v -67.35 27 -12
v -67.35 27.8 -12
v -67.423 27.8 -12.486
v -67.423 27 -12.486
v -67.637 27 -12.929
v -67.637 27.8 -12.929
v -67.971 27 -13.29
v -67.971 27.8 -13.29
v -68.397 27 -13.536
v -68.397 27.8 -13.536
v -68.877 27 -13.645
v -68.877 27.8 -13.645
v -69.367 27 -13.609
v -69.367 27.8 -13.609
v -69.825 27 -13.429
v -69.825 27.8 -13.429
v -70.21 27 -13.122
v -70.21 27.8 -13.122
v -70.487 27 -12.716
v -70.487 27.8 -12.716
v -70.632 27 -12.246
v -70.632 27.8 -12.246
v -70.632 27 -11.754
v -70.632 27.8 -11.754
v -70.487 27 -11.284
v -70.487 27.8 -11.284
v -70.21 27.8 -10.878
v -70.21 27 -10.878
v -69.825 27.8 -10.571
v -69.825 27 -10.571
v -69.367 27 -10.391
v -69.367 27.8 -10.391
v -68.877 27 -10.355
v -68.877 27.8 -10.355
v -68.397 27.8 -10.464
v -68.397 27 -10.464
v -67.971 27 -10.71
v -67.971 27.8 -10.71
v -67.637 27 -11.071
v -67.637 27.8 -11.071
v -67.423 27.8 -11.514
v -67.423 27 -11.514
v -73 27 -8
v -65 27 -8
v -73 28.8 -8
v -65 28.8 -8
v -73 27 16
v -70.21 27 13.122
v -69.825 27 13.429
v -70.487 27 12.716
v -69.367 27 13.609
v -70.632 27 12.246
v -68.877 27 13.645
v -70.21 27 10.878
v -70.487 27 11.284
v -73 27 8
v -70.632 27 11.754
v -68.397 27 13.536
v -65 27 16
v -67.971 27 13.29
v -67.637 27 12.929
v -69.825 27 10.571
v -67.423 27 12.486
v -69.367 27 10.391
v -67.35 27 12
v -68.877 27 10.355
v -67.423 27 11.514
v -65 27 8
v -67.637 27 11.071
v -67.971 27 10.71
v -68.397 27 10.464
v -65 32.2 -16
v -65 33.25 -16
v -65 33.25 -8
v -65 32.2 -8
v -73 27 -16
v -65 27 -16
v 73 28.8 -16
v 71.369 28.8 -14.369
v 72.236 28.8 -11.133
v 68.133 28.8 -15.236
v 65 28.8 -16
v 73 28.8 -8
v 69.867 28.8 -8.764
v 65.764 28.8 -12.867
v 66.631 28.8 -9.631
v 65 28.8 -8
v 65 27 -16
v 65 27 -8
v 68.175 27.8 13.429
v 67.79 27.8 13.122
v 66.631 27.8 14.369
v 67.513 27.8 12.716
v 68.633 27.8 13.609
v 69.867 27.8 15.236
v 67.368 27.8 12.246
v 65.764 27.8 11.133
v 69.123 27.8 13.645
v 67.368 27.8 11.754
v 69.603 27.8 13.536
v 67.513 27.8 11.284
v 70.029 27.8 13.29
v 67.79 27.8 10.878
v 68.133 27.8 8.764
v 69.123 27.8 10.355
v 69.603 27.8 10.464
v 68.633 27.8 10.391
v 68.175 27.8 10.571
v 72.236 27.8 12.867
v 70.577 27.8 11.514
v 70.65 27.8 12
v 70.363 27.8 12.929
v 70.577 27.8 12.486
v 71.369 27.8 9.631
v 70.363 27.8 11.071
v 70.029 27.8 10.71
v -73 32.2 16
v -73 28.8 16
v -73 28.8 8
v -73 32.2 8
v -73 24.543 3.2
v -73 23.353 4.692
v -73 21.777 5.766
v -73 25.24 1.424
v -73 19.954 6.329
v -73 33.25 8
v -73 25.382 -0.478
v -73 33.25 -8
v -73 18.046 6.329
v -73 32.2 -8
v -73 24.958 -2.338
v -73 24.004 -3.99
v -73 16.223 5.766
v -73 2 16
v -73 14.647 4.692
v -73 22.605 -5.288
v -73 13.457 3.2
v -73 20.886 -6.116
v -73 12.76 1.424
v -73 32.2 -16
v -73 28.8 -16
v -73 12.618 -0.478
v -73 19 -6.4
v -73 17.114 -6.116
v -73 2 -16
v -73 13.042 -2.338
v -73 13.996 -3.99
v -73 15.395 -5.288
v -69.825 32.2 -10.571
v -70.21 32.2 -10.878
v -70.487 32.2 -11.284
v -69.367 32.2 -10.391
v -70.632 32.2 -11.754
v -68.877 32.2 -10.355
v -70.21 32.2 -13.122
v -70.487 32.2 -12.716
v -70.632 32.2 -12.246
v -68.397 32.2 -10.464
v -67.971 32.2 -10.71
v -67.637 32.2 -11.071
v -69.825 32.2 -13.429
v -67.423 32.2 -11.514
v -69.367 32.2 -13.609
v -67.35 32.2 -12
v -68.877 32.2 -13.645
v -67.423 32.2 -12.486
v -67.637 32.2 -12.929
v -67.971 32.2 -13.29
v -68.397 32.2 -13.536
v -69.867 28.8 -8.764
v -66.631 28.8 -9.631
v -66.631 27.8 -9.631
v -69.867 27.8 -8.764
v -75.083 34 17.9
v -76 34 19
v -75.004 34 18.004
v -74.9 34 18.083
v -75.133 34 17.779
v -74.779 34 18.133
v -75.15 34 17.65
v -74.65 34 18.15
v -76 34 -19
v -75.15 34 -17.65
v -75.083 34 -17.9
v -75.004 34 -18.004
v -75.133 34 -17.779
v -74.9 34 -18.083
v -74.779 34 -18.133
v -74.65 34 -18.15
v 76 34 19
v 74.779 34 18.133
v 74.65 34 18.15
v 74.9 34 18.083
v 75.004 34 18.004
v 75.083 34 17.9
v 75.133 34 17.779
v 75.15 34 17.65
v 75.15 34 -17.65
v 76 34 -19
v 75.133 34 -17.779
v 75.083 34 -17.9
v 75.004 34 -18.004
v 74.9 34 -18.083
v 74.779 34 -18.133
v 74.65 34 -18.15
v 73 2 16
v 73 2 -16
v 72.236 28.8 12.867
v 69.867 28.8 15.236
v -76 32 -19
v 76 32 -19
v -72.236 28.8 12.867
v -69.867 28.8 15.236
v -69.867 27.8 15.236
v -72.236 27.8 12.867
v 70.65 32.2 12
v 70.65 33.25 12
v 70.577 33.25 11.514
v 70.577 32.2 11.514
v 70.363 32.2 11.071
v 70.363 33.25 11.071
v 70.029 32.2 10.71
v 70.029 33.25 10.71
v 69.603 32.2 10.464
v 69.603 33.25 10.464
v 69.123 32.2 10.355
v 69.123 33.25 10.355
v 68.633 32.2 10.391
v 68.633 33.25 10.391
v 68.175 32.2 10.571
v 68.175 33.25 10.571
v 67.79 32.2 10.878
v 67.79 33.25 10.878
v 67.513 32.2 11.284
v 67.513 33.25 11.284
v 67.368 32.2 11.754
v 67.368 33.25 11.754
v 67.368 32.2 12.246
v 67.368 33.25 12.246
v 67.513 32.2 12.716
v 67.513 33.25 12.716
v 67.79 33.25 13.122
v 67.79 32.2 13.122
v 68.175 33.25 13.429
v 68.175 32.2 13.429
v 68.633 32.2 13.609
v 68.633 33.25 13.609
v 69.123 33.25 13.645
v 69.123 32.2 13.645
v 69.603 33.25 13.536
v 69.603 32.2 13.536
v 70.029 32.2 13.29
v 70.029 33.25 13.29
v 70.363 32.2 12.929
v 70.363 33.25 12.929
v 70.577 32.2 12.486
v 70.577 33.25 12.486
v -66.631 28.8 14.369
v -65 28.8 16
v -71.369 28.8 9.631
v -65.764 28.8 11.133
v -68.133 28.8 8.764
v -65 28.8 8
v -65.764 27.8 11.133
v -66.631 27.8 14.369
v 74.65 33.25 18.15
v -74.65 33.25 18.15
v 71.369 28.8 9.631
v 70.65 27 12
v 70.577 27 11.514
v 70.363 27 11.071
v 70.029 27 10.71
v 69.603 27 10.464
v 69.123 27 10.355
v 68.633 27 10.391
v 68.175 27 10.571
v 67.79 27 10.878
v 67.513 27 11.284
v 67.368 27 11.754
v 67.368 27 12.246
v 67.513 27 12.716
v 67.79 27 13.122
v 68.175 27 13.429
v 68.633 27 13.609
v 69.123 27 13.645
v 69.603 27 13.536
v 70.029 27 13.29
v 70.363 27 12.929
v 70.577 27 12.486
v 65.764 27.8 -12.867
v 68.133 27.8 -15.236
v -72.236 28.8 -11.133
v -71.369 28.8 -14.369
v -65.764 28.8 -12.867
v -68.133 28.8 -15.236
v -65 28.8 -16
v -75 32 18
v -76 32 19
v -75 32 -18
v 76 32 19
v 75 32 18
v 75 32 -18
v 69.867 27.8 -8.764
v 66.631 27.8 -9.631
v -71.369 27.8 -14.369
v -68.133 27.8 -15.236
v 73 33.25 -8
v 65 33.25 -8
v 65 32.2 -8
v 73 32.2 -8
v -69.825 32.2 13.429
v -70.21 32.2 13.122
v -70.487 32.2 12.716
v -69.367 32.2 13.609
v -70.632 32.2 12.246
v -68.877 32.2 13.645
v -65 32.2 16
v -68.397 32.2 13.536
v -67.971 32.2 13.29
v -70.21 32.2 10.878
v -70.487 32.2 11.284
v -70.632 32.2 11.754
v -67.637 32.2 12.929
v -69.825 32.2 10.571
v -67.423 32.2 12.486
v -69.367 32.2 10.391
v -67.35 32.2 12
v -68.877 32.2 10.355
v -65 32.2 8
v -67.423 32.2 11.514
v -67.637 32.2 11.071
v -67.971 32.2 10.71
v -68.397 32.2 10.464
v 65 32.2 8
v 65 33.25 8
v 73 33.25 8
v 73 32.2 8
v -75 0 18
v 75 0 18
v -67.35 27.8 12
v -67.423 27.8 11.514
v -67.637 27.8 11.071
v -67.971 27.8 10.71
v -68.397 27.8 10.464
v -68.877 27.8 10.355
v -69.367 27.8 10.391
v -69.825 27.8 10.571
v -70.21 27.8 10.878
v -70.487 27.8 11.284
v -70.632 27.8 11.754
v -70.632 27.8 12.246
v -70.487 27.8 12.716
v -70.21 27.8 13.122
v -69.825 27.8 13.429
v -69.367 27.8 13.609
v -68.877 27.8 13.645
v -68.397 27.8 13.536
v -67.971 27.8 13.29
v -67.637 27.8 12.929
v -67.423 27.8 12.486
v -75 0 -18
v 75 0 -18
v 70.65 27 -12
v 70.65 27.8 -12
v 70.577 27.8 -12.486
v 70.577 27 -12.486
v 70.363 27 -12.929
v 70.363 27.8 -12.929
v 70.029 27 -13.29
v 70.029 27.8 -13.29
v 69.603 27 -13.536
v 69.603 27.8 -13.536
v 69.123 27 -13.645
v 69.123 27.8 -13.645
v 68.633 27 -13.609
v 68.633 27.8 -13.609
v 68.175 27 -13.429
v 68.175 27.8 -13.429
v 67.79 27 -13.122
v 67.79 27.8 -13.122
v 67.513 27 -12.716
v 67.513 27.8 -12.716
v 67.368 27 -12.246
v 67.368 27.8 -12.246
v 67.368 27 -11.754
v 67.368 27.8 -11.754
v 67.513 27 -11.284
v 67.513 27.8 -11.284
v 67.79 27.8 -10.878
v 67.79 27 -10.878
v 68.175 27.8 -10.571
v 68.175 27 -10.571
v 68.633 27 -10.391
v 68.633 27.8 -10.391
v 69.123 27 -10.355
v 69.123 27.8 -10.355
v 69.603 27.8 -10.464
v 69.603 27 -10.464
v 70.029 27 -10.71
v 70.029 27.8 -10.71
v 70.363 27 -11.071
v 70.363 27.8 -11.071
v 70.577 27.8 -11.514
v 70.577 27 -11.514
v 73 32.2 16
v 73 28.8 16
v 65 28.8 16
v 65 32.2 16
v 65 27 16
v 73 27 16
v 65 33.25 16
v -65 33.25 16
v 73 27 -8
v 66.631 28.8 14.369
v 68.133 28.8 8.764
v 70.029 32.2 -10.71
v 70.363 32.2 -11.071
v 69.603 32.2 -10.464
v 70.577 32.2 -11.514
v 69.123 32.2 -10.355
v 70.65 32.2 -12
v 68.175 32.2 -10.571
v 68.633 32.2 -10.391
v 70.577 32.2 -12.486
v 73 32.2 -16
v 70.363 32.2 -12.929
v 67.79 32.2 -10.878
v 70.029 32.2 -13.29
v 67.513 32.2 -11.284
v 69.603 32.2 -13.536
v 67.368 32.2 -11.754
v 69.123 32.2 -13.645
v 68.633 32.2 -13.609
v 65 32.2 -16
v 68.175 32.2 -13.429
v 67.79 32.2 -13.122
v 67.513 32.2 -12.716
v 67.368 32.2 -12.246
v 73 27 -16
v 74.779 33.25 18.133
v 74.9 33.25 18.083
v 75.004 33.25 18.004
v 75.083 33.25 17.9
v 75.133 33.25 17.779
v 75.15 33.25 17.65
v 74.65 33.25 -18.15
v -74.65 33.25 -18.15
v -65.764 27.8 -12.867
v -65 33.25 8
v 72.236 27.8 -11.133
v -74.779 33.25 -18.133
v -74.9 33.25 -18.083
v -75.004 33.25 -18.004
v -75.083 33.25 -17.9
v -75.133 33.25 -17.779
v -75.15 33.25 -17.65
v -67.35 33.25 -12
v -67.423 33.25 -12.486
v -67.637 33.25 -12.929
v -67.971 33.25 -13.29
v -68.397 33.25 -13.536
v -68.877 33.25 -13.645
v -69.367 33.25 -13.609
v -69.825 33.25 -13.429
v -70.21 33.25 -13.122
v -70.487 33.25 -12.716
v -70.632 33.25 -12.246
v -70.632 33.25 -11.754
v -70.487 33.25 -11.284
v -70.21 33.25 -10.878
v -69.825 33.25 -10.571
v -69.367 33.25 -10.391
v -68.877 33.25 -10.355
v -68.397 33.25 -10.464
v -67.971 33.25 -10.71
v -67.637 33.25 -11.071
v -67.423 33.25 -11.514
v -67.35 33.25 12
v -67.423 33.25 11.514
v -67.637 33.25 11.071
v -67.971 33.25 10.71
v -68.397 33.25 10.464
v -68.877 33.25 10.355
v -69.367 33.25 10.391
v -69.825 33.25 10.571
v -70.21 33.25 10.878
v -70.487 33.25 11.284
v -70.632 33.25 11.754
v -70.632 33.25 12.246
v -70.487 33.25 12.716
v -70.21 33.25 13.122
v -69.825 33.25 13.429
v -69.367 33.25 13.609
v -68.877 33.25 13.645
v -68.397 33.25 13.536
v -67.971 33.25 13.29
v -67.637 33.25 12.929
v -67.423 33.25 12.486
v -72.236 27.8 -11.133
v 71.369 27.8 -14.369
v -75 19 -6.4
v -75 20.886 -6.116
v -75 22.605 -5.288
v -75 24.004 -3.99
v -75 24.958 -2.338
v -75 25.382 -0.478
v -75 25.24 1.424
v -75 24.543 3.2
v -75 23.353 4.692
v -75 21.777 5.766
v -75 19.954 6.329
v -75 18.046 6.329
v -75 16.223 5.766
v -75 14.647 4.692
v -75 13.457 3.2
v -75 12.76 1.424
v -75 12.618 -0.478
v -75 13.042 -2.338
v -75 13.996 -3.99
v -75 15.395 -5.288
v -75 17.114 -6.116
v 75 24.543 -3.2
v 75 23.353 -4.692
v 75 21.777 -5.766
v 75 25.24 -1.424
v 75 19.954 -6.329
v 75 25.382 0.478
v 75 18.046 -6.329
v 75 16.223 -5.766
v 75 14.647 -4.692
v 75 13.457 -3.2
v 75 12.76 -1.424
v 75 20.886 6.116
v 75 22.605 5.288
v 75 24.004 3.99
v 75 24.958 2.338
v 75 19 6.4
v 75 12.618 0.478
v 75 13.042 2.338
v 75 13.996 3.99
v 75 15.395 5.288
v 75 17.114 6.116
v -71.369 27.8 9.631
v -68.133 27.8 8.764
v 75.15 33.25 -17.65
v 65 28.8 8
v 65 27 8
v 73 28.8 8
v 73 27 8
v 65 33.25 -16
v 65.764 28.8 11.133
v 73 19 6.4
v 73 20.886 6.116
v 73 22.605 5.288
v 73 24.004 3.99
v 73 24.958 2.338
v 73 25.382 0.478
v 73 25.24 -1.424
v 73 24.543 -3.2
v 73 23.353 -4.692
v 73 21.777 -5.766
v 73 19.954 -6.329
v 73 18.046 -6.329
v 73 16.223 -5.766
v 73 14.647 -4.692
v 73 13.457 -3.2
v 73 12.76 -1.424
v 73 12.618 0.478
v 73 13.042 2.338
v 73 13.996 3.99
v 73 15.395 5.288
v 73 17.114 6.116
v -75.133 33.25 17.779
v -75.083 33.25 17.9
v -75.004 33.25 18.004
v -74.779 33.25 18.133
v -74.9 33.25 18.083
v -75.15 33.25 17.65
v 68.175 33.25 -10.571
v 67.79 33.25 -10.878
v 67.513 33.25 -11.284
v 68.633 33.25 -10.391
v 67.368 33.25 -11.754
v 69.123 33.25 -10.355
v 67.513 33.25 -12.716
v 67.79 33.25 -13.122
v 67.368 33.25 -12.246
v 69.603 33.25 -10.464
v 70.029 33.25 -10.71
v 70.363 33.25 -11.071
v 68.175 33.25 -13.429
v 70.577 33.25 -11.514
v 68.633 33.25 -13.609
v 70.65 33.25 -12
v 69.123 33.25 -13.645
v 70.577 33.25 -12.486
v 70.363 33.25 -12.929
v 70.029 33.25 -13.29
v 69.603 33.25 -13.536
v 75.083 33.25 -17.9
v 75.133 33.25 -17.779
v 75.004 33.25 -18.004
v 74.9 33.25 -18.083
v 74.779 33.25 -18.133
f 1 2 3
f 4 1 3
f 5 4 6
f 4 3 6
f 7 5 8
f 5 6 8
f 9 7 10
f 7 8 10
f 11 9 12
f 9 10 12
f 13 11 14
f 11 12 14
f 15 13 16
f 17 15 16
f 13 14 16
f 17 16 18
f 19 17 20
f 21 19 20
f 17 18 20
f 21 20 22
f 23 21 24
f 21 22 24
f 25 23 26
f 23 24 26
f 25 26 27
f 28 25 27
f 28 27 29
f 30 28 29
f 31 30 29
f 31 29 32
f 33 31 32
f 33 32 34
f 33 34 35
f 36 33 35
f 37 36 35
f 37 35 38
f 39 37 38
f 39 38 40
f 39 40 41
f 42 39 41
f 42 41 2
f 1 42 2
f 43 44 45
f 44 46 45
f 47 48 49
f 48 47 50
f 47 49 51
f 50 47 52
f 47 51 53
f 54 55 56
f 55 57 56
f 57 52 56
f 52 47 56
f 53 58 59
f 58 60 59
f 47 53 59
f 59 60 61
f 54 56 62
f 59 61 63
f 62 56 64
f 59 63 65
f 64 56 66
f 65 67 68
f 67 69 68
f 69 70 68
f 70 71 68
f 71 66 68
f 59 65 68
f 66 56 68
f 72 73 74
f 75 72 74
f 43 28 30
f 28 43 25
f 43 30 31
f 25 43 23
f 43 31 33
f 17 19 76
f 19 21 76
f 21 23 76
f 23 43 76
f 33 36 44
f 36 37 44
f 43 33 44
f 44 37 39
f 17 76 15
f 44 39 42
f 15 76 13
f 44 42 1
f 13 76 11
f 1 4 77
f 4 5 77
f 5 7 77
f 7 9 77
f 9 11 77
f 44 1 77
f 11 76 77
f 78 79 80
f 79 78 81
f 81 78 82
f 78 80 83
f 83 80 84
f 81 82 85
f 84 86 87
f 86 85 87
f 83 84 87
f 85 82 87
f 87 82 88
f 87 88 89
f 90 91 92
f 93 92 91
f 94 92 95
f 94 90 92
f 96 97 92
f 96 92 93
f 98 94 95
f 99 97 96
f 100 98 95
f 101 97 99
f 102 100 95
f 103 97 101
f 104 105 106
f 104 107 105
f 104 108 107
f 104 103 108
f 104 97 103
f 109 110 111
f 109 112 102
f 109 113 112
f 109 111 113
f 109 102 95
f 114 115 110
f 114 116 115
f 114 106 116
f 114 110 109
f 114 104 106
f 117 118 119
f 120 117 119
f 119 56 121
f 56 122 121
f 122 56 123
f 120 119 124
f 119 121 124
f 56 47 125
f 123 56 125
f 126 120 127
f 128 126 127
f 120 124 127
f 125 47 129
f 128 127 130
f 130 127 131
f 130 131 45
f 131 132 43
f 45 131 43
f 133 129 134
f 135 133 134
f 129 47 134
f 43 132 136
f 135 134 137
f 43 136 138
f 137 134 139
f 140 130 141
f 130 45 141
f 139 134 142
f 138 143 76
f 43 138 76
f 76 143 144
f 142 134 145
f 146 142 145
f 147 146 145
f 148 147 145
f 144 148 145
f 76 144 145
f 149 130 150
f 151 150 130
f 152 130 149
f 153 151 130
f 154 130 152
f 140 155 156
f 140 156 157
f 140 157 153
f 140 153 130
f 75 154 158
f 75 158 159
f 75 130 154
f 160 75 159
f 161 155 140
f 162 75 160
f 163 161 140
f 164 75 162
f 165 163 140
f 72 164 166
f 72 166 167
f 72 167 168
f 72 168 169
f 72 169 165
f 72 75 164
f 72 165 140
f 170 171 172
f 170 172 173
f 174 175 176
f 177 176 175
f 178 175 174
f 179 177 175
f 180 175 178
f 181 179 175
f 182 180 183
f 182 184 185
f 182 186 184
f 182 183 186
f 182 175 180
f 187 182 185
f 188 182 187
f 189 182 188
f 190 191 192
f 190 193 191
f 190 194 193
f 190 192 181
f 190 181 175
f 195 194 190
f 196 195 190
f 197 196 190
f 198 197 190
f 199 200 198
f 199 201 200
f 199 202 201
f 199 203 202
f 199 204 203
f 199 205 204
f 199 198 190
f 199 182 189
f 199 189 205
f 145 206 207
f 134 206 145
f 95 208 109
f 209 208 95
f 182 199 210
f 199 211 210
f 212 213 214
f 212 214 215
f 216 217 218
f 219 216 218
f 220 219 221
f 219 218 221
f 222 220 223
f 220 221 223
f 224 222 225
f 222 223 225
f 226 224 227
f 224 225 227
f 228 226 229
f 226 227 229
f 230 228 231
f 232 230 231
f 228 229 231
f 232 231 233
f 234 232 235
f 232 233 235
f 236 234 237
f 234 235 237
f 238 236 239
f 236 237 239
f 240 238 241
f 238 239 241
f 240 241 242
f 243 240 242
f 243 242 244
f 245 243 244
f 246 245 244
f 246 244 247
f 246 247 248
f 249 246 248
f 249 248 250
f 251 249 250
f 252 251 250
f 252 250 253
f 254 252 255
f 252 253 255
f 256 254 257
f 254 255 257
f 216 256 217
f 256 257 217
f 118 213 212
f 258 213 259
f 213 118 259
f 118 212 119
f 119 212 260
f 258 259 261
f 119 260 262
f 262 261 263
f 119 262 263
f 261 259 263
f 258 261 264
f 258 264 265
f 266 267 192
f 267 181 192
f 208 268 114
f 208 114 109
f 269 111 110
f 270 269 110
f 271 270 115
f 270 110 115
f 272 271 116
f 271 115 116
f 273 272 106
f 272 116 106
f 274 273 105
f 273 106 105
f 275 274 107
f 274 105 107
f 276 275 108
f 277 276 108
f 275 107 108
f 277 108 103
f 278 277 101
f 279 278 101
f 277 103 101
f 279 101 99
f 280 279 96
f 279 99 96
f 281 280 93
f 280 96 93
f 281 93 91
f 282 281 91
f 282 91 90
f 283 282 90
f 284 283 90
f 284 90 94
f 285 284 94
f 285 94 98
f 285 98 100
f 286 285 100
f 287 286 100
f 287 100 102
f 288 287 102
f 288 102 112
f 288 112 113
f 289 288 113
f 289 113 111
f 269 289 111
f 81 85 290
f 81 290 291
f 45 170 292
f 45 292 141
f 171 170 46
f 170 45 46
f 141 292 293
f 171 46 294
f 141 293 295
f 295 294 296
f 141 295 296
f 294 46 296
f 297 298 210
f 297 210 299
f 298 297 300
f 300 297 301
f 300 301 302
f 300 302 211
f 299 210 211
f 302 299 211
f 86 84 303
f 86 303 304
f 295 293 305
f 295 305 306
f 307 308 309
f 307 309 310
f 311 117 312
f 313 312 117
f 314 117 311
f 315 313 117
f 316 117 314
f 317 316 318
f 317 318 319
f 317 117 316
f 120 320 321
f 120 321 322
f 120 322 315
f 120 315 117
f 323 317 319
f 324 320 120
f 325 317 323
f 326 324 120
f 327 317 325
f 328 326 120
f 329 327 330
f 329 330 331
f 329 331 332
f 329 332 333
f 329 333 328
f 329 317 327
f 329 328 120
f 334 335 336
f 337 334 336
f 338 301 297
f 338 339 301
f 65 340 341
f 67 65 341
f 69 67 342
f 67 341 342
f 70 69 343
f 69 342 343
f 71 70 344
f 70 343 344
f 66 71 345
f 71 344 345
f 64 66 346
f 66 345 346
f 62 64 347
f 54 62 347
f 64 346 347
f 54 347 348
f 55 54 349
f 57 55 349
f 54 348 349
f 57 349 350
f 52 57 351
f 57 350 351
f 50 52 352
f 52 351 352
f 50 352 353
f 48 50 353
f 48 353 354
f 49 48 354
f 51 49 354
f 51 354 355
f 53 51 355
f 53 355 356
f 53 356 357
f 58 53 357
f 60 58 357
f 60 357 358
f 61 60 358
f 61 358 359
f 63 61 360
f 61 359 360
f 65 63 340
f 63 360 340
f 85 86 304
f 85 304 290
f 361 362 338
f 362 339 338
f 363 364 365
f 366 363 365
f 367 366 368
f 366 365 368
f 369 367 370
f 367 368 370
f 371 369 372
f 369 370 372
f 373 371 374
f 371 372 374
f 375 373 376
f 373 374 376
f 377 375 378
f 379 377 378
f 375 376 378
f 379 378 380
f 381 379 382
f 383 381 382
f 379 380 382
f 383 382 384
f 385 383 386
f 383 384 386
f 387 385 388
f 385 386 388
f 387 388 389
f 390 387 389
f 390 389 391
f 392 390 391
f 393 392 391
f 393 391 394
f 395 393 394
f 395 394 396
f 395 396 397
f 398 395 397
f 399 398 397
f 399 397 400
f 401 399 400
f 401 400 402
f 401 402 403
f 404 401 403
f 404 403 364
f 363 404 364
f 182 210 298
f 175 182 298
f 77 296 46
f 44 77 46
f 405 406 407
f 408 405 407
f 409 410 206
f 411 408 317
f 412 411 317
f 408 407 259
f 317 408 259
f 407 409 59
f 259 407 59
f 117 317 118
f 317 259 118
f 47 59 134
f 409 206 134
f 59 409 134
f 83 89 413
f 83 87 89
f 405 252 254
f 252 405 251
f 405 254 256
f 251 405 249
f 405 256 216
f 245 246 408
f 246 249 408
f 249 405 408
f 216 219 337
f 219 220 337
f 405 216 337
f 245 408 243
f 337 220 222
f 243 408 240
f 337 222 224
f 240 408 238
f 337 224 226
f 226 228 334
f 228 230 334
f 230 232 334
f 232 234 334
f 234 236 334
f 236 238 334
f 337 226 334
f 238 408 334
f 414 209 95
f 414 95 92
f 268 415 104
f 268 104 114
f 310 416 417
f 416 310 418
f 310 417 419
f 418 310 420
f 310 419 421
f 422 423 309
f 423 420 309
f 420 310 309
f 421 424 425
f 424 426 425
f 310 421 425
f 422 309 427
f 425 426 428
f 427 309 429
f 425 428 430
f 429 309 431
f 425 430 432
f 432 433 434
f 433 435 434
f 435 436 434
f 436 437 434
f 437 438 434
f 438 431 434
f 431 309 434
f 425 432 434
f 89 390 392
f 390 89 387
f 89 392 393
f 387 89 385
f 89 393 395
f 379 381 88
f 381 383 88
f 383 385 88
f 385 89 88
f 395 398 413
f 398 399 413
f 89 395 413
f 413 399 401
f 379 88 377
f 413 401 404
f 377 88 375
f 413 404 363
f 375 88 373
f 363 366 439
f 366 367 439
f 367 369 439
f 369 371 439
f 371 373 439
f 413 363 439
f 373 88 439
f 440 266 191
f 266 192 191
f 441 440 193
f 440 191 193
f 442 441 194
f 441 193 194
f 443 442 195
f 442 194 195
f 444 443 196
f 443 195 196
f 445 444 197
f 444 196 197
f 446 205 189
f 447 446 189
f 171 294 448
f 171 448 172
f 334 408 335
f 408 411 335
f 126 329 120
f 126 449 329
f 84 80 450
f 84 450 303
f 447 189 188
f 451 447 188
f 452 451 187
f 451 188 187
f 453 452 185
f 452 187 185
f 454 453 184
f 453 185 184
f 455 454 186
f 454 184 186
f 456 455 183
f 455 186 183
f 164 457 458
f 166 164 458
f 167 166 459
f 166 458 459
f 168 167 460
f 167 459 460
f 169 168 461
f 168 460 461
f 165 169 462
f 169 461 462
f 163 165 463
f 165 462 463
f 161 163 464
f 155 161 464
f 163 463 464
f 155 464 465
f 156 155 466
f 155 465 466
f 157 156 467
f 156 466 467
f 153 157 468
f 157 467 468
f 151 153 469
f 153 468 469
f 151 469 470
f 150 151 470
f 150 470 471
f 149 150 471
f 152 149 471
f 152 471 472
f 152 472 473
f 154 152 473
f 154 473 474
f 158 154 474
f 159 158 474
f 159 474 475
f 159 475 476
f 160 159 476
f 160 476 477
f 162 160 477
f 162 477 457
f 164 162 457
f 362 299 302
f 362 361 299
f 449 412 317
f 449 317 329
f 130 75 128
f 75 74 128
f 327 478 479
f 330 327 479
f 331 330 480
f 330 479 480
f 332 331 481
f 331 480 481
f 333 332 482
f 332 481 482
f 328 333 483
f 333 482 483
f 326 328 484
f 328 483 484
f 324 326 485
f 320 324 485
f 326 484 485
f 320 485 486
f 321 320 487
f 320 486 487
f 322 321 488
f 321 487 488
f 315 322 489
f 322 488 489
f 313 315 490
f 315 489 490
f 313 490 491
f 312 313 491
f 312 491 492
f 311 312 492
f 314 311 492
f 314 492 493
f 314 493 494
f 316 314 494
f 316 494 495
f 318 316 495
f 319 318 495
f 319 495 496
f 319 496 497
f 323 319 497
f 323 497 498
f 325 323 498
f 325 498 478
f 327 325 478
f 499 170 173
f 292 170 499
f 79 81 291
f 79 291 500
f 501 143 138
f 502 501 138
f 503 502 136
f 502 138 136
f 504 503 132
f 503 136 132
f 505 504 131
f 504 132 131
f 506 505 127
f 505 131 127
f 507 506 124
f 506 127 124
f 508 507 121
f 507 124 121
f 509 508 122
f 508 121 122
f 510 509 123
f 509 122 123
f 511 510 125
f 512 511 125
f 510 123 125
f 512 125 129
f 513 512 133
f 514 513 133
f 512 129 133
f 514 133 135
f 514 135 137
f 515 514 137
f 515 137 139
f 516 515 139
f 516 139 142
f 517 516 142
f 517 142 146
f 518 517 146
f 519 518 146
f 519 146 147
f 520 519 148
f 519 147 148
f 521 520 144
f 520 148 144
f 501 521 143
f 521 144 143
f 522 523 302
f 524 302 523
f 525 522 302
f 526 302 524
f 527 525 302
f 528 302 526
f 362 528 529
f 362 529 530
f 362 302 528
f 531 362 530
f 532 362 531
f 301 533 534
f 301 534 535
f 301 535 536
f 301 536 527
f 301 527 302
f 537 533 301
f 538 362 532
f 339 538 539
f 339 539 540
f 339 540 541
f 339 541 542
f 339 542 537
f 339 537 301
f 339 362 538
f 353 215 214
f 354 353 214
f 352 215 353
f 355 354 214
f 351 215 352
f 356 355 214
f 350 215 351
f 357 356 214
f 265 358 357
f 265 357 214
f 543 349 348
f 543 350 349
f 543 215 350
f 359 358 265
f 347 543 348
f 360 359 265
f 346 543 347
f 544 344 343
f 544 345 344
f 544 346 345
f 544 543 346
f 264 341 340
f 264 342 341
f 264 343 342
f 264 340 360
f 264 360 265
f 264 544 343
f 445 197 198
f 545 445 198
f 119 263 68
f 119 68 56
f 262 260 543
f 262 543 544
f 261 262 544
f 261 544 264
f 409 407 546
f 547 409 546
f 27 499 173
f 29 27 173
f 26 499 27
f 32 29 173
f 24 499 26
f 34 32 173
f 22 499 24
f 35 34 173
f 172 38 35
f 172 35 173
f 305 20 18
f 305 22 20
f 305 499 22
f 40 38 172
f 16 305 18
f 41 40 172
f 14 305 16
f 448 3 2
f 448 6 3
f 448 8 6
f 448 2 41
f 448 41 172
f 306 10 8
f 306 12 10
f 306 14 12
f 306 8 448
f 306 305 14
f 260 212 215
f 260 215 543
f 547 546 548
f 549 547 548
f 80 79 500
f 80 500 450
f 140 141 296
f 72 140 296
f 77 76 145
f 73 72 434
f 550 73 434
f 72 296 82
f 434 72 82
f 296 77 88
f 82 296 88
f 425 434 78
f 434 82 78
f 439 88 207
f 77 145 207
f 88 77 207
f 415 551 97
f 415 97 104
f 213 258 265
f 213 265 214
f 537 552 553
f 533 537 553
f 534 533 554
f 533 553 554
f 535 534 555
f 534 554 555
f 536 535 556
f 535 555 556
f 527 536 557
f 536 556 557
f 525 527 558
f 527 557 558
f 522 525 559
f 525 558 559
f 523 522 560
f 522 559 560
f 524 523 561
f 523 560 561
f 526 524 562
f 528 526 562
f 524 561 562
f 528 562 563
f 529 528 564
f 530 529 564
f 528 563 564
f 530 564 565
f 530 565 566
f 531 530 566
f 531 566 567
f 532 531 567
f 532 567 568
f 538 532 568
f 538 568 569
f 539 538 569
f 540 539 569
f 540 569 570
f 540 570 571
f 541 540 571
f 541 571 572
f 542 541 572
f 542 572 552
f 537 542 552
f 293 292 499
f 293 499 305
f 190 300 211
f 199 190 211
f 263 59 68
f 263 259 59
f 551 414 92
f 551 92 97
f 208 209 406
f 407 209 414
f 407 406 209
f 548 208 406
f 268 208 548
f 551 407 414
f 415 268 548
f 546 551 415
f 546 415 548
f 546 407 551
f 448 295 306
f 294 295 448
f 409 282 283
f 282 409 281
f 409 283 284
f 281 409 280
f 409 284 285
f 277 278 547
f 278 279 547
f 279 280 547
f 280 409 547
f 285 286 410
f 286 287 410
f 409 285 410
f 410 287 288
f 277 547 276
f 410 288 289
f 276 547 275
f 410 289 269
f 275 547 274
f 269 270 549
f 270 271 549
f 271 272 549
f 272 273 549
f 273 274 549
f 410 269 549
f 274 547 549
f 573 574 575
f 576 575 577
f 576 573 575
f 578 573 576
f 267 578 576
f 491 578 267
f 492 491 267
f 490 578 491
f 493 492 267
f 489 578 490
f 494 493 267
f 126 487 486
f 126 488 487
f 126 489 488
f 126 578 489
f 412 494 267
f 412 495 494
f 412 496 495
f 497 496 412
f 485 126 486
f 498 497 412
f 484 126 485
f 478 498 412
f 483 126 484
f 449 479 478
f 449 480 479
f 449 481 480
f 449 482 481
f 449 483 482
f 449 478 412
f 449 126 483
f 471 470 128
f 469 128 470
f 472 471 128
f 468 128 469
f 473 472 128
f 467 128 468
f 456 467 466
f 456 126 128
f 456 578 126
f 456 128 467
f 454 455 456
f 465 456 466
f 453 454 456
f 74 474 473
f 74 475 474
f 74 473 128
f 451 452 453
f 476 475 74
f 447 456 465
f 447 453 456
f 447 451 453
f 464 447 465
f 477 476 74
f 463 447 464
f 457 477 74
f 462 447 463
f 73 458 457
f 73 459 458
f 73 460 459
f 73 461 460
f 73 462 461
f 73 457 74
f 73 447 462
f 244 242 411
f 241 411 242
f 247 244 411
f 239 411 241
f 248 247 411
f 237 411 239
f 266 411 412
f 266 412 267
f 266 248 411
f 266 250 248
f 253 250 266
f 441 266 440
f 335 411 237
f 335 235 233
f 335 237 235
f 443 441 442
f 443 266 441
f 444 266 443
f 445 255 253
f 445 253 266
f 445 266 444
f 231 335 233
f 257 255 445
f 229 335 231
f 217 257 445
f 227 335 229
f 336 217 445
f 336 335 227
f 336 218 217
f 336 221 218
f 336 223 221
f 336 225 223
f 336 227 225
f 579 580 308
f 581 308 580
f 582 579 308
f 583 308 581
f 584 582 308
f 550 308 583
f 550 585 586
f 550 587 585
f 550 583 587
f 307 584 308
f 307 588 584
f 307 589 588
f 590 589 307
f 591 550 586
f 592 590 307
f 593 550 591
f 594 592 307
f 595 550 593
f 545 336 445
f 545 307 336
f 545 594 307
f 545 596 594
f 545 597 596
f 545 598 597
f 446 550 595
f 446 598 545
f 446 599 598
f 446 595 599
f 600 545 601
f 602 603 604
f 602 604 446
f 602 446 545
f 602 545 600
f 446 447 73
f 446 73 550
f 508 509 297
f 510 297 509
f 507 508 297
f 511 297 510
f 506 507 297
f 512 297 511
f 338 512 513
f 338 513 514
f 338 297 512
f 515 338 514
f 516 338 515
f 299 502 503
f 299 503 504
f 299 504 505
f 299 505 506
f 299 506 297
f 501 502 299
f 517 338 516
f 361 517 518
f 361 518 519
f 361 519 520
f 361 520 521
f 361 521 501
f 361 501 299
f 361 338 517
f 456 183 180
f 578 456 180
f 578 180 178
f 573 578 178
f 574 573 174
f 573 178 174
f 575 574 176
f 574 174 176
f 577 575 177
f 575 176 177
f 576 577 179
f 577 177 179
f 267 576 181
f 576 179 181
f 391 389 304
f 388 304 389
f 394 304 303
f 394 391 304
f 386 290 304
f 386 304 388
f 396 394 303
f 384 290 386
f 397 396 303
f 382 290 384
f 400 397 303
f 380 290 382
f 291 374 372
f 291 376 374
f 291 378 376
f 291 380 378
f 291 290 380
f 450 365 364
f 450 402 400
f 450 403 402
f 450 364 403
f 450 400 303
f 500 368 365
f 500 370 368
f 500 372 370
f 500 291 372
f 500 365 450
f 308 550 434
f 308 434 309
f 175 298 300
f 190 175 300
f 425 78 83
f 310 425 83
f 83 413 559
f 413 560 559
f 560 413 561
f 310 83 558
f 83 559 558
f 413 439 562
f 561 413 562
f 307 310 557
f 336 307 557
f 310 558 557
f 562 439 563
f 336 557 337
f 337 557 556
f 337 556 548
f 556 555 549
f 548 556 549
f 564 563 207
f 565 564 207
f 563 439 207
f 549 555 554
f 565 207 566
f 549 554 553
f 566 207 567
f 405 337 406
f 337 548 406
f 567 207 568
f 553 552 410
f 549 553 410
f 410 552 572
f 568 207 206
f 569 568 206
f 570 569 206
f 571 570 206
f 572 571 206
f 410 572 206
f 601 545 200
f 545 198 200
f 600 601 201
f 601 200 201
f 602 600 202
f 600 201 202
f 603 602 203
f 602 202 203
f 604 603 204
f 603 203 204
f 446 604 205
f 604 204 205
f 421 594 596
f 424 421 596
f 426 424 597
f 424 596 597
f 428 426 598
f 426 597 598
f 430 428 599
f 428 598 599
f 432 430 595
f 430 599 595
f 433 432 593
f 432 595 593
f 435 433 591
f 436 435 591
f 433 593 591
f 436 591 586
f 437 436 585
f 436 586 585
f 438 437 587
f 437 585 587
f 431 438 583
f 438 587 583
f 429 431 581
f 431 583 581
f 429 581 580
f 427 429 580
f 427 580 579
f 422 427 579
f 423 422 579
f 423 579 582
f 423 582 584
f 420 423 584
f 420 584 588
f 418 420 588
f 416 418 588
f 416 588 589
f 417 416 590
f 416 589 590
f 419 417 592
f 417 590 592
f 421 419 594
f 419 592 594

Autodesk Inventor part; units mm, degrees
ref_plane "YZ Plane" through (0, 0, 0) normal (1, 0, 0) x (0, 1, 0)
ref_plane "XZ Plane" through (0, 0, 0) normal (0, 1, 0) x (-1, 0, 0)
sketch "Sketch1" plane through (0, 0, 0) normal (0, 1, 0) x (-1, 0, 0)
  line L0 (75, -18) -> (-75, -18)
  line L1 (-75, -18) -> (-75, 18)
  line L2 (-75, 18) -> (75, 18)
  line L3 (75, 18) -> (75, -18)
  line L4 (75, -18) -> (-75, 18) construction
  line L5 (-75, -18) -> (75, 18) construction
  point P0 (0, 0)
  dimension "d0" = 150
  dimension "d1" = 36
extrude "Extrusion1" add sketch "Sketch1" along normal blind 2
sketch "Sketch3" plane through (0, 2, 0) normal (0, 1, 0) x (1, 0, 0)
  line L0 (75, 18) -> (-75, 18) projected
  line L1 (-75, 18) -> (-75, -18) projected
  line L2 (73, -16) -> (-73, -16)
  line L3 (-73, -16) -> (-73, 16)
  line L4 (-73, 16) -> (73, 16)
  line L5 (73, 16) -> (73, -16)
  line L6 (-75, -18) -> (75, -18) projected
  line L7 (-75, -18) -> (75, -18)
  line L8 (75, -18) -> (75, 18)
  line L9 (75, 18) -> (-75, 18)
  line L10 (-75, 18) -> (-75, -18)
  point P0 (0, 0)
extrude "Extrusion3" add sketch "Sketch3" along normal blind 30
sketch "Sketch4" plane through (-73, 2, 16) normal (1, 0, 0) x (0, 0, -1)
  line L0 (32, 0) -> (0, 0) projected
  line L1 (32, 0) -> (32, 30) projected
  line L2 (0, 30) -> (32, 30) projected
  line L3 (0, 0) -> (0, 30) projected
  line L4 (0, 30) -> (32, 30) projected
  line L5 (32, 0) -> (32, 30) projected
  line L6 (0, 30) -> (32, 30)
  line L7 (32, 30) -> (32, 0)
  line L8 (32, 0) -> (0, 0)
  line L9 (0, 0) -> (0, 30)
  line L10 (32, 0) -> (0, 0) projected
  circle A0 centre (16, 17) radius 6.4
  point P0 (16, -2)
extrude "Extrusion4" cut sketch "Sketch4" against normal blind 30 contours A0
sketch "Sketch5" plane through (73, 2, -16) normal (-1, 0, 0) x (0, 0, 1)
  line L0 (32, 0) -> (0, 0) projected
  line L1 (32, 0) -> (32, 30) projected
  line L2 (0, 30) -> (32, 30) projected
  line L3 (0, 0) -> (0, 30) projected
  line L4 (0, 30) -> (32, 30) projected
  line L5 (0, 30) -> (32, 30)
  line L6 (32, 30) -> (32, 0)
  line L7 (32, 0) -> (0, 0)
  line L8 (0, 0) -> (0, 30)
  line L9 (0, 0) -> (0, 30) projected
  circle A0 centre (16, 17) radius 6.4
  point P0 (16, -2)
  dimension "d23" = 12.8
extrude "Extrusion5" cut sketch "Sketch5" against normal blind 30 contours A0
sketch "Sketch6" plane through (0, 32, 0) normal (0, 1, 0) x (1, 0, 0)
  line L0 (75, 18) -> (-75, 18) projected
  line L1 (-75, 18) -> (-75, -18) projected
  line L2 (-75, -18) -> (75, -18) projected
  line L3 (75, -18) -> (75, 18) projected
  line L4 (73, -16) -> (-73, -16) projected
  line L5 (-73, -16) -> (-73, 16) projected
  line L6 (-73, 16) -> (73, 16) projected
  line L7 (73, 16) -> (73, -16) projected
  line L8 (-76, -18) -> (-76, -19)
  line L9 (75, -18) -> (75, 18) projected
  line L10 (75, 19) -> (76, 19)
  line L11 (76, 19) -> (-76, 19)
  line L12 (-76, 19) -> (-76, -19)
  line L13 (-76, -19) -> (76, -19)
  line L14 (76, -19) -> (76, 19)
  line L15 (-73, -16) -> (-73, 16) projected
  line L16 (73, 16) -> (-73, 16) projected
  line L17 (-73, -16) -> (73, -16)
  line L18 (73, -16) -> (73, 16)
  line L19 (73, 16) -> (-73, 16)
  line L20 (-73, 16) -> (-73, -16)
  point P0 (0, 0)
  dimension "d26" = 1
  dimension "d27" = 1
  dimension "d28" = 1
  dimension "d29" = 1
extrude "Extrusion6" add sketch "Sketch6" along normal blind 2 contours L3 L2 L1 L0 | L12 L11 L10 L14 L13 L8
sketch "Sketch7" plane through (0, 34, 0) normal (0, 1, 0) x (1, 0, 0)
  line L0 (76, 19) -> (-76, 19) projected
  line L1 (-76, 19) -> (-76, -19) projected
  line L2 (-76, -19) -> (76, -19) projected
  line L3 (76, -19) -> (76, 19) projected
  line L4 (73, 16) -> (73, -16) projected
  line L5 (73, -16) -> (-73, -16) projected
  line L6 (-73, -16) -> (-73, 16) projected
  line L7 (-73, 16) -> (73, 16) projected
  line L8 (73, -16) -> (-73, -16) projected
  line L9 (-73.65, -16) -> (-73.65, -16.15)
  line L10 (-76, 19) -> (-76, -19) projected
  line L11 (-76, -19) -> (-76, -18.15)
  line L12 (76, 19) -> (-76, 19) projected
  line L13 (76, 19) -> (75.15, 19)
  line L14 (-73, 16) -> (73, 16) projected
  line L15 (72.8, 16.65) -> (73.15, 16.65)
  line L16 (73.65, 16.65) -> (-73.15, 16.65)
  line L17 (-73.65, 16.15) -> (-73.65, -16.65)
  line L18 (-73.15, -16.65) -> (73.15, -16.65)
  line L19 (73.65, -16.15) -> (73.65, 16.15)
  line L20 (-74.65, -18.15) -> (74.65, -18.15)
  line L21 (75.15, -17.65) -> (75.15, 17.65)
  line L22 (74.65, 18.15) -> (-74.65, 18.15)
  line L23 (-75.15, 17.65) -> (-75.15, -17.65)
  arc A0 (-75.15, -17.65) -> (-74.65, -18.15) centre (-74.65, -17.65) ccw
  arc A1 (-73.65, -16.15) -> (-73.15, -16.65) centre (-73.15, -16.15) ccw
  arc A2 (-73.15, 16.65) -> (-73.65, 16.15) centre (-73.15, 16.15) ccw
  arc A3 (-74.65, 18.15) -> (-75.15, 17.65) centre (-74.65, 17.65) ccw
  arc A4 (73.15, -16.65) -> (73.65, -16.15) centre (73.15, -16.15) ccw
  arc A5 (74.65, -18.15) -> (75.15, -17.65) centre (74.65, -17.65) ccw
  arc A6 (73.65, 16.15) -> (73.15, 16.65) centre (73.15, 16.15) ccw
  arc A7 (75.15, 17.65) -> (74.65, 18.15) centre (74.65, 17.65) ccw
  point P0 (0, 0)
  point P1 (-75.15, -18.15)
  point P2 (75.15, 18.15)
  point P3 (-73.65, 16.65)
  point P4 (73.65, -16.65)
  point P5 (75.15, -18.15)
  point P6 (-75.15, 18.15)
  dimension "d34" = 0.85
  dimension "d184" = 1.5
  dimension "d185" = 1.5
  dimension "d186" = 1.5
  dimension "d187" = 1.5
  dimension "d188" = 0.65
  dimension "d191" = 0.5
  dimension "d192" = 0.5
sketch "Sketch8" plane through (0, 34, 0) normal (0, 1, 0) x (1, 0, 0)
  point P0 (0, 0)
sketch "Sketch9" plane through (-73, 2, 16) normal (1, 0, 0) x (0, 0, -1)
  point P0 (16, -2)
sketch "Sketch29" plane through (0, 34, 0) normal (0, 1, 0) x (1, 0, 0)
  line L0 (73, 16) -> (73, -16) projected
  line L1 (73, -16) -> (-73, -16) projected
  line L2 (-73, -16) -> (-73, 16) projected
  line L3 (-73, 16) -> (73, 16) projected
  line L4 (75.15, 18.15) -> (75.15, -18.15) projected
  line L5 (-75.15, 18.15) -> (75.15, 18.15) projected
  line L6 (-75.15, -18.15) -> (-75.15, 18.15) projected
  line L7 (75.15, -18.15) -> (-75.15, -18.15) projected
  line L8 (73.65, -16.65) -> (73.65, 16.65) projected
  line L9 (-73.65, -16.65) -> (73.65, -16.65) projected
  line L10 (-73.65, 16.65) -> (-73.65, -16.65) projected
  line L11 (73.65, 16.65) -> (-73.65, 16.65) projected
  line L12 (-76, 19) -> (-76, -19) projected
  line L13 (76, 19) -> (-76, 19) projected
  line L14 (-76, 19) -> (-76, -19) projected
  line L15 (-76, -19) -> (76, -19) projected
  line L16 (76, -19) -> (76, 19) projected
  line L17 (-73, -16) -> (73, -16) projected
  line L18 (-73, -16) -> (-73, 16) projected
  line L19 (-73, -16) -> (-65.5, -16) construction
  line L20 (-73, -16) -> (-65, -16)
  line L21 (-65, -16) -> (-65, -8)
  line L22 (-65, -8) -> (-73, -8)
  line L23 (-73, -8) -> (-73, -16)
  line L24 (-73, 16) -> (-65, 16)
  line L25 (-65, 16) -> (-65, 8)
  line L26 (-65, 8) -> (-73, 8)
  line L27 (-73, 8) -> (-73, 16)
  line L28 (73, 16) -> (-73, 16) projected
  line L29 (73, 16) -> (65, 16)
  line L30 (65, 16) -> (65, 8)
  line L31 (65, 8) -> (73, 8)
  line L32 (73, 8) -> (73, 16)
  line L33 (73, -16) -> (65, -16)
  line L34 (65, -16) -> (65, -8)
  line L35 (65, -8) -> (73, -8)
  line L36 (73, -8) -> (73, -16)
  point P0 (0, 0)
  dimension "d120" = 8
  dimension "d121" = 8
  dimension "d122" = 8
  dimension "d123" = 8
  dimension "d124" = 8
  dimension "d125" = 8
  dimension "d126" = 8
  dimension "d127" = 8
extrude "Extrusion22" add sketch "Sketch29" against normal blind 7 contours L0 L31 L30 L3 | L0 L1 L34 L35 | L25 L26 L2 L3 | L1 L2 L22 L21
sketch "Sketch30" plane through (-65, 34, -8) normal (1, 0, 0) x (0, 0, -1)
  line L0 (0, 0) -> (8, 0) projected
  line L1 (0, 0) -> (0, -7) projected
  line L2 (8, -7) -> (0, -7) projected
  line L3 (8, 0) -> (8, -7) projected
  line L4 (-24, 0) -> (-16, 0) projected
  line L5 (-24, -7) -> (-24, 0) projected
  line L6 (-16, -7) -> (-24, -7) projected
  line L7 (-16, 0) -> (-16, -7) projected
  line L8 (0, 0) -> (0, -7) projected
  line L9 (8, 0) -> (0, 0)
  line L10 (0, 0) -> (0, -1.8)
  line L11 (0, -1.8) -> (8, -1.8)
  line L12 (8, -1.8) -> (8, 0)
  line L13 (8, 0) -> (8, -7) projected
  line L14 (8, -7) -> (0, -7)
  line L15 (0, -7) -> (0, -5.2)
  line L16 (0, -5.2) -> (8, -5.2)
  line L17 (8, -5.2) -> (8, -7)
  line L18 (0, -1.8) -> (8, -1.8)
  line L19 (8, -1.8) -> (8, -5.2)
  line L20 (8, -5.2) -> (0, -5.2)
  line L21 (0, -5.2) -> (0, -1.8)
  line L22 (-24, 0) -> (-16, 0) projected
  line L23 (-16, 0) -> (-24, 0)
  line L24 (-24, 0) -> (-24, -1.8)
  line L25 (-24, -1.8) -> (-16, -1.8)
  line L26 (-16, -1.8) -> (-16, 0)
  line L27 (-16, -7) -> (-24, -7)
  line L28 (-24, -7) -> (-24, -5.2)
  line L29 (-24, -5.2) -> (-16, -5.2)
  line L30 (-16, -5.2) -> (-16, -7)
  line L31 (-16, -1.8) -> (-24, -1.8)
  line L32 (-24, -1.8) -> (-24, -5.2)
  line L33 (-24, -5.2) -> (-16, -5.2)
  line L34 (-16, -5.2) -> (-16, -1.8)
  point P0 (-8, -34)
  point P1 (-24, -5.2)
  point P2 (-16, -5.2)
  point P3 (-16, -1.8)
  point P4 (-24, -1.8)
  point P5 (0, -5.2)
  point P6 (8, -5.2)
  point P7 (8, -1.8)
  point P8 (0, -1.8)
  dimension "d130" = 1.8
  dimension "d131" = 1.8
  dimension "d132" = 8
  dimension "d133" = 1.8
  dimension "d134" = 8
  dimension "d135" = 1.8
extrude "Extrusion23" cut sketch "Sketch30" against normal blind 8 contours L11 L3 L16 L1 | L25 L7 L29 L5
sketch "Sketch31" plane through (65, 34, -16) normal (-1, 0, 0) x (0, 0, 1)
  point P0 (16, -34)
sketch "Sketch32" plane through (65, 34, -16) normal (-1, 0, 0) x (0, 0, 1)
  line L0 (0, 0) -> (8, 0) projected
  line L1 (0, -7) -> (0, 0) projected
  line L2 (8, -7) -> (0, -7) projected
  line L3 (8, 0) -> (8, -7) projected
  line L4 (32, -7) -> (24, -7) projected
  line L5 (24, 0) -> (32, 0) projected
  line L6 (24, 0) -> (24, -7) projected
  line L7 (32, -7) -> (24, -7) projected
  line L8 (32, 0) -> (32, -7) projected
  line L9 (0, 0) -> (8, 0)
  line L10 (8, 0) -> (8, -1.8)
  line L11 (8, -1.8) -> (0, -1.8)
  line L12 (0, -1.8) -> (0, 0)
  line L13 (8, -7) -> (0, -7)
  line L14 (0, -7) -> (0, -5.2)
  line L15 (0, -5.2) -> (8, -5.2)
  line L16 (8, -5.2) -> (8, -7)
  line L17 (0, -1.8) -> (8, -1.8)
  line L18 (8, -1.8) -> (8, -5.2)
  line L19 (8, -5.2) -> (0, -5.2)
  line L20 (0, -5.2) -> (0, -1.8)
  line L21 (24, 0) -> (32, 0) projected
  line L22 (24, 0) -> (32, 0)
  line L23 (32, 0) -> (32, -1.8)
  line L24 (32, -1.8) -> (24, -1.8)
  line L25 (24, -1.8) -> (24, 0)
  line L26 (24, -7) -> (32, -7)
  line L27 (32, -7) -> (32, -5.2)
  line L28 (32, -5.2) -> (24, -5.2)
  line L29 (24, -5.2) -> (24, -7)
  line L30 (24, -1.8) -> (32, -1.8)
  line L31 (32, -1.8) -> (32, -5.2)
  line L32 (32, -5.2) -> (24, -5.2)
  line L33 (24, -5.2) -> (24, -1.8)
  point P0 (16, -34)
  point P1 (24, -5.2)
  point P2 (32, -5.2)
  point P3 (32, -1.8)
  point P4 (24, -1.8)
  point P5 (0, -5.2)
  point P6 (8, -5.2)
  point P7 (8, -1.8)
  point P8 (0, -1.8)
  dimension "d138" = 8
  dimension "d139" = 1.8
  dimension "d140" = 8
  dimension "d141" = 1.8
  dimension "d142" = 8
  dimension "d143" = 1.8
  dimension "d144" = 8
  dimension "d145" = 1.8
extrude "Extrusion24" cut sketch "Sketch32" against normal blind 8 contours L11 L3 L15 L1 | L28 L6 L24 L8
sketch "Sketch34" plane through (65, 28.8, -8) normal (0, 1, 0) x (1, 0, 0)
  line L0 (8, 8) -> (0, 8)
  line L1 (0, 8) -> (0, 0)
  line L2 (0, 0) -> (8, 0)
  line L3 (8, 0) -> (8, 8)
  line L4 (0, 0) -> (0, 8)
  line L5 (8, 0) -> (0, 0) projected
  circle A0 centre (4, 4) radius 3.35
  line L6 (1.6312, 1.6312) -> (0.7641, 4.867)
  line L7 (0.7641, 4.867) -> (3.133, 7.2359)
  line L8 (3.133, 7.2359) -> (6.3688, 6.3688)
  line L9 (6.3688, 6.3688) -> (7.2359, 3.133)
  line L10 (7.2359, 3.133) -> (4.867, 0.7641)
  line L11 (4.867, 0.7641) -> (1.6312, 1.6312)
  point P0 (-65, -8)
sketch "Sketch35" plane through (65, 28.8, 16) normal (0, 1, 0) x (1, 0, 0)
  line L0 (8, 8) -> (0, 8)
  line L1 (0, 8) -> (0, 0)
  line L2 (0, 0) -> (8, 0)
  line L3 (8, 0) -> (8, 8)
  line L4 (0, 0) -> (0, 8)
  line L5 (8, 0) -> (8, 8) projected
  line L6 (0, 0) -> (0, 8) projected
  circle A0 centre (4, 4) radius 3.35
  line L7 (1.6312, 1.6312) -> (0.7641, 4.867)
  line L8 (0.7641, 4.867) -> (3.133, 7.2359)
  line L9 (3.133, 7.2359) -> (6.3688, 6.3688)
  line L10 (6.3688, 6.3688) -> (7.2359, 3.133)
  line L11 (7.2359, 3.133) -> (4.867, 0.7641)
  line L12 (4.867, 0.7641) -> (1.6312, 1.6312)
  point P0 (-65, 16)
extrude "Extrusion26" cut sketch "Sketch35" against normal blind 1 contours L10 L11 L12 L7 L8 L9
extrude "Extrusion27" cut sketch "Sketch34" against normal blind 1 contours L9 L10 L11 L6 L7 L8
sketch "Sketch36" plane through (-65, 28.8, -8) normal (0, 1, 0) x (1, 0, 0)
  line L0 (-8, 8) -> (0, 8)
  line L1 (0, 8) -> (0, 0)
  line L2 (0, 0) -> (-8, 0)
  line L3 (-8, 0) -> (-8, 8)
  line L4 (0, 0) -> (-8, 0)
  circle A0 centre (-4, 4) radius 3.35
  line L5 (-1.6312, 1.6312) -> (-4.867, 0.7641)
  line L6 (-4.867, 0.7641) -> (-7.2359, 3.133)
  line L7 (-7.2359, 3.133) -> (-6.3688, 6.3688)
  line L8 (-6.3688, 6.3688) -> (-3.133, 7.2359)
  line L9 (-3.133, 7.2359) -> (-0.7641, 4.867)
  line L10 (-0.7641, 4.867) -> (-1.6312, 1.6312)
  point P0 (65, -8)
  dimension "d163" = 6.7
extrude "Extrusion28" cut sketch "Sketch36" against normal blind 1 contours L10 L5 L6 L7 L8 L9
sketch "Sketch37" plane through (-73, 28.8, 8) normal (0, 1, 0) x (1, 0, 0)
  line L0 (0, 0) -> (8, 0) projected
  line L1 (8, 0) -> (8, -8) projected
  line L2 (0, 0) -> (8, 0)
  line L3 (8, 0) -> (8, -8)
  line L4 (8, -8) -> (0, -8)
  line L5 (0, -8) -> (0, 0)
  circle A0 centre (4, -4) radius 3.35
  line L6 (6.3688, -6.3688) -> (3.133, -7.2359)
  line L7 (3.133, -7.2359) -> (0.7641, -4.867)
  line L8 (0.7641, -4.867) -> (1.6312, -1.6312)
  line L9 (1.6312, -1.6312) -> (4.867, -0.7641)
  line L10 (4.867, -0.7641) -> (7.2359, -3.133)
  line L11 (7.2359, -3.133) -> (6.3688, -6.3688)
  point P0 (73, 8)
  dimension "d166" = 6.7
extrude "Extrusion29" cut sketch "Sketch37" against normal blind 1 contours L11 L6 L7 L8 L9 L10
sketch "Sketch38" plane through (0, 34, 0) normal (0, 1, 0) x (1, 0, 0)
  line L0 (73, 8) -> (73, -8) projected
  line L1 (73, -8) -> (65, -8) projected
  line L2 (65, -8) -> (65, -16) projected
  line L3 (65, -16) -> (-65, -16) projected
  line L4 (-65, -16) -> (-65, -8) projected
  line L5 (-65, -8) -> (-73, -8) projected
  line L6 (-73, -8) -> (-73, 8) projected
  line L7 (-73, 8) -> (-65, 8) projected
  line L8 (-65, 8) -> (-65, 16) projected
  line L9 (-65, 16) -> (65, 16) projected
  line L10 (65, 16) -> (65, 8) projected
  line L11 (65, 8) -> (73, 8) projected
  line L12 (-65, 8) -> (-73, 8) projected
  line L13 (-65, 8) -> (-73, 8)
  line L14 (-73, 8) -> (-73, 16)
  line L15 (-73, 16) -> (-65, 16)
  line L16 (-65, 16) -> (-65, 8)
  circle A0 centre (-69, 12) radius 1.65
  line L17 (-73, -8) -> (-65, -8) projected
  line L18 (-65, -8) -> (-73, -8)
  line L19 (-73, -8) -> (-73, -16)
  line L20 (-73, -16) -> (-65, -16)
  line L21 (-65, -16) -> (-65, -8)
  circle A1 centre (-69, -12) radius 1.65
  line L22 (73, 8) -> (65, 8) projected
  line L23 (65, 8) -> (73, 8)
  line L24 (73, 8) -> (73, 16)
  line L25 (73, 16) -> (65, 16)
  line L26 (65, 16) -> (65, 8)
  line L27 (65, -8) -> (65, -16) projected
  line L28 (65, -8) -> (73, -8)
  line L29 (73, -8) -> (73, -16)
  line L30 (73, -16) -> (65, -16)
  line L31 (65, -16) -> (65, -8)
  circle A2 centre (69, 12) radius 1.65
  circle A3 centre (69, -12) radius 1.65
  point P0 (0, 0)
  dimension "d169" = 8
  dimension "d170" = 8
  dimension "d171" = 3.3
  dimension "d172" = 8
  dimension "d173" = 8
  dimension "d174" = 3.3
  dimension "d175" = 8
  dimension "d176" = 8
  dimension "d177" = 8
  dimension "d178" = 8
  dimension "d179" = 3.3
  dimension "d180" = 3.3
extrude "Extrusion30" cut sketch "Sketch38" against normal blind 8 contours A0 | A1 | A2 | A3
ref_plane "Work Plane2" through (0, 33.25, 0) normal (0, 1, 0) x (1, 0, 0)
sketch "Sketch39" plane through (0, 33.25, 0) normal (0, 1, 0) x (1, 0, 0)
  line L0 (-73.65, -16.65) -> (73.65, -16.65) projected
  line L1 (75.15, 18.15) -> (75.15, -18.15) projected
  line L2 (-75.15, 18.15) -> (75.15, 18.15) projected
  line L3 (-75.15, -18.15) -> (-75.15, 18.15) projected
  line L4 (75.15, -18.15) -> (-75.15, -18.15) projected
  line L5 (73.65, -16.65) -> (73.65, 16.65) projected
  line L6 (-73.65, -16.65) -> (73.65, -16.65) projected
  line L7 (-73.65, 16.65) -> (-73.65, -16.65) projected
  line L8 (73.65, 16.65) -> (-73.65, 16.65) projected
  line L9 (65, -16) -> (-65, -16) projected
  line L10 (75.15, -18.15) -> (-75.15, -18.15) projected
  line L11 (-76, -19) -> (76, -19) projected
  line L12 (-73.65, -16.65) -> (73.65, -16.65) projected
  line L13 (-73, -16) -> (-65, -16) projected
  line L14 (75.15, 18.15) -> (75.15, -18.15) projected
  line L15 (-75.15, 18.15) -> (75.15, 18.15) projected
  line L16 (-75.15, -18.15) -> (-75.15, 18.15) projected
  line L17 (75.15, -18.15) -> (-75.15, -18.15) projected
  line L18 (73.65, -16.65) -> (73.65, 16.65) projected
  line L19 (-73.65, -16.65) -> (73.65, -16.65) projected
  line L20 (-73.65, 16.65) -> (-73.65, -16.65) projected
  line L21 (73.65, 16.65) -> (-73.65, 16.65) projected
  line L22 (75.15, 18.15) -> (75.15, -18.15) projected
  line L23 (-75.15, 18.15) -> (75.15, 18.15) projected
  line L24 (-75.15, -18.15) -> (-75.15, 18.15) projected
  line L25 (75.15, -18.15) -> (-75.15, -18.15) projected
  line L26 (73.65, -16.65) -> (73.65, 16.65) projected
  line L27 (-73.65, -16.65) -> (73.65, -16.65) projected
  line L28 (-73.65, 16.65) -> (-73.65, -16.65) projected
  line L29 (73.65, 16.65) -> (-73.65, 16.65) projected
  point P0 (0, 0)
extrude "Extrusion31" cut sketch "Sketch7" against normal blind 0.75 contours L4 L5 L6 L7 | L17 A2 L16 L15 A6 L19 A4 L18 A1 L9 | A0 L23 A3 L22 A7 L21 A5 L20
properties part number "base inferior" material "Steel, Mild, Welded"
